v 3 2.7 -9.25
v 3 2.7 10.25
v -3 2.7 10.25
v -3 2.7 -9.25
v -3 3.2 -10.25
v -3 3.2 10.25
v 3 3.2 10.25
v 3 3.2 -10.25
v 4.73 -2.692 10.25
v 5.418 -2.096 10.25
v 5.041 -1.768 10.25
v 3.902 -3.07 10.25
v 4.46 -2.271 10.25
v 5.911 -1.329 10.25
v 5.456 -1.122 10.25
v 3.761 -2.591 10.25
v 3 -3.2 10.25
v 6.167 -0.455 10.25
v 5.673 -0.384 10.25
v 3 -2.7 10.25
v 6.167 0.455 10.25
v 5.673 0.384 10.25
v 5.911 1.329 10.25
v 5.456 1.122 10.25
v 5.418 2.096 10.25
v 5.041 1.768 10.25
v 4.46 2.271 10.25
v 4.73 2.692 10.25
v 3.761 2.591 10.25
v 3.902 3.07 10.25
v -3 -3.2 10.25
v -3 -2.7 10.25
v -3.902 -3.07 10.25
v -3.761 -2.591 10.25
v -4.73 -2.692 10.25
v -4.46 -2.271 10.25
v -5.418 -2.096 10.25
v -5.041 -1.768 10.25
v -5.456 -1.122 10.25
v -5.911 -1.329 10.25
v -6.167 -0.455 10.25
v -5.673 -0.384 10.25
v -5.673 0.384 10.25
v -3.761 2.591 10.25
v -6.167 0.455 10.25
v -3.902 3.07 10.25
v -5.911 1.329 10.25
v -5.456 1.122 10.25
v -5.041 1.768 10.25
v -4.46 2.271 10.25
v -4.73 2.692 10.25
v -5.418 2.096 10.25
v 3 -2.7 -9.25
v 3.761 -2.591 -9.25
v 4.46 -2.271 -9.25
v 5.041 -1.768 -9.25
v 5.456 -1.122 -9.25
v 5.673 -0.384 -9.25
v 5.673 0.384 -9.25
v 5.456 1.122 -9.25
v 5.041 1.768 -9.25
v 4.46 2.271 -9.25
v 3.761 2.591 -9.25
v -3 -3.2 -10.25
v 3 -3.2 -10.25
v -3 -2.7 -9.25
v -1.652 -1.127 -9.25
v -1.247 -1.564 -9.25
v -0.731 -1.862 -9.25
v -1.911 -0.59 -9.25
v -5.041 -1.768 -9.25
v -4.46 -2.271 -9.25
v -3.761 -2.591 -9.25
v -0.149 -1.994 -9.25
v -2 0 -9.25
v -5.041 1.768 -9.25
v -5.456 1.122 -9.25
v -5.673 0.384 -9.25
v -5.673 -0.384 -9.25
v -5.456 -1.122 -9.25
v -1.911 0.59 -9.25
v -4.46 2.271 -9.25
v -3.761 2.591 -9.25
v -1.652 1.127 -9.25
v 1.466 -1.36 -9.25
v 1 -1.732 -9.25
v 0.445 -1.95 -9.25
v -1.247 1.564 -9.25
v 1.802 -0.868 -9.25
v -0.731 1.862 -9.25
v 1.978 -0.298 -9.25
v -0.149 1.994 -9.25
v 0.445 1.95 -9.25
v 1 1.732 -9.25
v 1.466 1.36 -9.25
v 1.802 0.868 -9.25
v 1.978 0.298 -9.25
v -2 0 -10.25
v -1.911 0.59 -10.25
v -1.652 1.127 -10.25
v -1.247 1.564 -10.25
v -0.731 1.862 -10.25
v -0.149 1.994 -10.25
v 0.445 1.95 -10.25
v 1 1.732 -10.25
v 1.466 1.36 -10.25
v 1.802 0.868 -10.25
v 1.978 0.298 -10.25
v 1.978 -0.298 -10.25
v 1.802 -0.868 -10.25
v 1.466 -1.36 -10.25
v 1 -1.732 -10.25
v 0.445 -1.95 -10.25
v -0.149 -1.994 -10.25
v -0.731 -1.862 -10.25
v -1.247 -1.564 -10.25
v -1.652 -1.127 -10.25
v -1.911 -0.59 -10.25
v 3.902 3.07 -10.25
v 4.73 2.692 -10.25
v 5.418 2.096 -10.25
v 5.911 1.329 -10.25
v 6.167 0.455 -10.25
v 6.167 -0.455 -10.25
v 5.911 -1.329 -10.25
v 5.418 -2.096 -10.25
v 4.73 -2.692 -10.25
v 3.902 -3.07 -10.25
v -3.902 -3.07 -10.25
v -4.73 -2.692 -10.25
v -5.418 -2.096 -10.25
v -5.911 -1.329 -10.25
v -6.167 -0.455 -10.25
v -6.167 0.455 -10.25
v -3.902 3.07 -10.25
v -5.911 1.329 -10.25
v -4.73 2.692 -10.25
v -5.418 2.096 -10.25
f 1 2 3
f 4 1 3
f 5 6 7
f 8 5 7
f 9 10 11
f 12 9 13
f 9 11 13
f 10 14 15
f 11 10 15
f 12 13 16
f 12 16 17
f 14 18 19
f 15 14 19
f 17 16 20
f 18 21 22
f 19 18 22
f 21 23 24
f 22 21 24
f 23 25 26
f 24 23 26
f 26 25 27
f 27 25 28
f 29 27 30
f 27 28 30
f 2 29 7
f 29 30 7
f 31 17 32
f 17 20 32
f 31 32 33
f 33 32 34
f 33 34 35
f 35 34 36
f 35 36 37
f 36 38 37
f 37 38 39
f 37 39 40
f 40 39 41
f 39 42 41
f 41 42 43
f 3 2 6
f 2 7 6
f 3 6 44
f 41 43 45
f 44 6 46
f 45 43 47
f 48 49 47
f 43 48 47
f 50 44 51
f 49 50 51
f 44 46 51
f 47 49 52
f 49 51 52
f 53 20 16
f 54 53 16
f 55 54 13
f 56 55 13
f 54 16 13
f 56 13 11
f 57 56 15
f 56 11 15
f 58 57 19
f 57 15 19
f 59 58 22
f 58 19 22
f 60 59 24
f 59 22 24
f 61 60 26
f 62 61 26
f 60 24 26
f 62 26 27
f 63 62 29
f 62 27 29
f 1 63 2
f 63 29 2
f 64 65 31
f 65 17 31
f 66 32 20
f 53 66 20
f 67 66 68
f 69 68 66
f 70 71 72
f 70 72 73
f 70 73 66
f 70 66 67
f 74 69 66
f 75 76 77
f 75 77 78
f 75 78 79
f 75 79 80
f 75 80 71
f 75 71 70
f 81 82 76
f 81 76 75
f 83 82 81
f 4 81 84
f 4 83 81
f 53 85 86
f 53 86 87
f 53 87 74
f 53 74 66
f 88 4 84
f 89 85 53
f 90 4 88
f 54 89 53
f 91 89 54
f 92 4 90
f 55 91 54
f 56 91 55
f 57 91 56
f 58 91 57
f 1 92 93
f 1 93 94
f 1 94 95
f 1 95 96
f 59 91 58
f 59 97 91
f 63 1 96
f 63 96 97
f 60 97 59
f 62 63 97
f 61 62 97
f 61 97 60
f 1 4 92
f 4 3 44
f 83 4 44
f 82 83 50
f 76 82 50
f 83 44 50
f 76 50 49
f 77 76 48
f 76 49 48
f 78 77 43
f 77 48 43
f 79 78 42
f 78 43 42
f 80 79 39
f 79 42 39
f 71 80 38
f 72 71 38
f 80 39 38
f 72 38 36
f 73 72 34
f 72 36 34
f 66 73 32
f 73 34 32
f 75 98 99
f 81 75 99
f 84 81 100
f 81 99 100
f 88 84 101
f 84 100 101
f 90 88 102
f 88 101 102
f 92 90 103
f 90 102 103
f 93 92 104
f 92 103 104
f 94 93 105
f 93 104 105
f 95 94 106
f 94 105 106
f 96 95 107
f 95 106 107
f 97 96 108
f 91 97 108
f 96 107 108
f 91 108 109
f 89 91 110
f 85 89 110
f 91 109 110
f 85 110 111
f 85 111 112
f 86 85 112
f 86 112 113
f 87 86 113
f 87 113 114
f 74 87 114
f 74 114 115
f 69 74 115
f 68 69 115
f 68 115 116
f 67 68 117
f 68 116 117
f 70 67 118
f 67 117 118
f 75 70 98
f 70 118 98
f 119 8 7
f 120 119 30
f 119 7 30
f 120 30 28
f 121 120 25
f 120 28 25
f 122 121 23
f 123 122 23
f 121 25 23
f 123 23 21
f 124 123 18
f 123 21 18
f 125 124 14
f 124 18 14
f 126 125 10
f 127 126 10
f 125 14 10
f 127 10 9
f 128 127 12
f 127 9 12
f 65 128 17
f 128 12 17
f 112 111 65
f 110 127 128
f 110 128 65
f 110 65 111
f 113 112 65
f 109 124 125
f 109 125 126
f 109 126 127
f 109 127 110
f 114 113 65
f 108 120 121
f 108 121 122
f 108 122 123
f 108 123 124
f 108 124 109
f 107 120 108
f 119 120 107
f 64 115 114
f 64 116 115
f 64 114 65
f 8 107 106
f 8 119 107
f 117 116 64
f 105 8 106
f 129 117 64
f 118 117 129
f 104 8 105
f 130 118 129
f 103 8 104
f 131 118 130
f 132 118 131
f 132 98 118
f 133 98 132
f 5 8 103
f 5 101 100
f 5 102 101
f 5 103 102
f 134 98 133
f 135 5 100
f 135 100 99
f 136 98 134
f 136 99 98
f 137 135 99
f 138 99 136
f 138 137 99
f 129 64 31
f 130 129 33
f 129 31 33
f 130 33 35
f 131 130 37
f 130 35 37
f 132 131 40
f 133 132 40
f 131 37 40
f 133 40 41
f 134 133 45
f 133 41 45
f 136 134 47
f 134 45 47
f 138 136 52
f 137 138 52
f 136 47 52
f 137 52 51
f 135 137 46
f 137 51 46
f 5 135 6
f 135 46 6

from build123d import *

# Parameters (mm, degrees)
PROFILE_DEPTH = 10.25
POCKET_DEPTH  = 19.5
HOLES_R       = 2
HOLE_DEPTH    = 1


with BuildPart() as part:
    # ProfileS → Profile (new, symmetric)
    with BuildSketch(Plane.XY):
        with BuildLine():
            Line((-3, 3.2), (3, 3.2))
            ThreePointArc((3, 3.2), (6.2, 0), (3, -3.2))
            Line((3, -3.2), (-3, -3.2))
            ThreePointArc((-3, -3.2), (-6.2, 0), (-3, 3.2))
        make_face()
    extrude(amount=PROFILE_DEPTH, both=True)

    # PocketS → Pocket (cut)
    with BuildSketch(Plane.XY.offset(10.25)):
        with BuildLine():
            Line((-3, -2.7), (3, -2.7))
            ThreePointArc((3, -2.7), (5.7, 0), (3, 2.7))
            Line((3, 2.7), (-3, 2.7))
            ThreePointArc((-3, 2.7), (-5.7, 0), (-3, -2.7))
        make_face()
    extrude(amount=-POCKET_DEPTH, mode=Mode.SUBTRACT)

    # HoleS → Hole (cut)
    with BuildSketch(Plane(origin=(0, 0, -10.25), x_dir=(-1, 0, 0), z_dir=(0, 0, -1))):
        Circle(HOLES_R)
    extrude(amount=-HOLE_DEPTH, mode=Mode.SUBTRACT)


solid = part.part
